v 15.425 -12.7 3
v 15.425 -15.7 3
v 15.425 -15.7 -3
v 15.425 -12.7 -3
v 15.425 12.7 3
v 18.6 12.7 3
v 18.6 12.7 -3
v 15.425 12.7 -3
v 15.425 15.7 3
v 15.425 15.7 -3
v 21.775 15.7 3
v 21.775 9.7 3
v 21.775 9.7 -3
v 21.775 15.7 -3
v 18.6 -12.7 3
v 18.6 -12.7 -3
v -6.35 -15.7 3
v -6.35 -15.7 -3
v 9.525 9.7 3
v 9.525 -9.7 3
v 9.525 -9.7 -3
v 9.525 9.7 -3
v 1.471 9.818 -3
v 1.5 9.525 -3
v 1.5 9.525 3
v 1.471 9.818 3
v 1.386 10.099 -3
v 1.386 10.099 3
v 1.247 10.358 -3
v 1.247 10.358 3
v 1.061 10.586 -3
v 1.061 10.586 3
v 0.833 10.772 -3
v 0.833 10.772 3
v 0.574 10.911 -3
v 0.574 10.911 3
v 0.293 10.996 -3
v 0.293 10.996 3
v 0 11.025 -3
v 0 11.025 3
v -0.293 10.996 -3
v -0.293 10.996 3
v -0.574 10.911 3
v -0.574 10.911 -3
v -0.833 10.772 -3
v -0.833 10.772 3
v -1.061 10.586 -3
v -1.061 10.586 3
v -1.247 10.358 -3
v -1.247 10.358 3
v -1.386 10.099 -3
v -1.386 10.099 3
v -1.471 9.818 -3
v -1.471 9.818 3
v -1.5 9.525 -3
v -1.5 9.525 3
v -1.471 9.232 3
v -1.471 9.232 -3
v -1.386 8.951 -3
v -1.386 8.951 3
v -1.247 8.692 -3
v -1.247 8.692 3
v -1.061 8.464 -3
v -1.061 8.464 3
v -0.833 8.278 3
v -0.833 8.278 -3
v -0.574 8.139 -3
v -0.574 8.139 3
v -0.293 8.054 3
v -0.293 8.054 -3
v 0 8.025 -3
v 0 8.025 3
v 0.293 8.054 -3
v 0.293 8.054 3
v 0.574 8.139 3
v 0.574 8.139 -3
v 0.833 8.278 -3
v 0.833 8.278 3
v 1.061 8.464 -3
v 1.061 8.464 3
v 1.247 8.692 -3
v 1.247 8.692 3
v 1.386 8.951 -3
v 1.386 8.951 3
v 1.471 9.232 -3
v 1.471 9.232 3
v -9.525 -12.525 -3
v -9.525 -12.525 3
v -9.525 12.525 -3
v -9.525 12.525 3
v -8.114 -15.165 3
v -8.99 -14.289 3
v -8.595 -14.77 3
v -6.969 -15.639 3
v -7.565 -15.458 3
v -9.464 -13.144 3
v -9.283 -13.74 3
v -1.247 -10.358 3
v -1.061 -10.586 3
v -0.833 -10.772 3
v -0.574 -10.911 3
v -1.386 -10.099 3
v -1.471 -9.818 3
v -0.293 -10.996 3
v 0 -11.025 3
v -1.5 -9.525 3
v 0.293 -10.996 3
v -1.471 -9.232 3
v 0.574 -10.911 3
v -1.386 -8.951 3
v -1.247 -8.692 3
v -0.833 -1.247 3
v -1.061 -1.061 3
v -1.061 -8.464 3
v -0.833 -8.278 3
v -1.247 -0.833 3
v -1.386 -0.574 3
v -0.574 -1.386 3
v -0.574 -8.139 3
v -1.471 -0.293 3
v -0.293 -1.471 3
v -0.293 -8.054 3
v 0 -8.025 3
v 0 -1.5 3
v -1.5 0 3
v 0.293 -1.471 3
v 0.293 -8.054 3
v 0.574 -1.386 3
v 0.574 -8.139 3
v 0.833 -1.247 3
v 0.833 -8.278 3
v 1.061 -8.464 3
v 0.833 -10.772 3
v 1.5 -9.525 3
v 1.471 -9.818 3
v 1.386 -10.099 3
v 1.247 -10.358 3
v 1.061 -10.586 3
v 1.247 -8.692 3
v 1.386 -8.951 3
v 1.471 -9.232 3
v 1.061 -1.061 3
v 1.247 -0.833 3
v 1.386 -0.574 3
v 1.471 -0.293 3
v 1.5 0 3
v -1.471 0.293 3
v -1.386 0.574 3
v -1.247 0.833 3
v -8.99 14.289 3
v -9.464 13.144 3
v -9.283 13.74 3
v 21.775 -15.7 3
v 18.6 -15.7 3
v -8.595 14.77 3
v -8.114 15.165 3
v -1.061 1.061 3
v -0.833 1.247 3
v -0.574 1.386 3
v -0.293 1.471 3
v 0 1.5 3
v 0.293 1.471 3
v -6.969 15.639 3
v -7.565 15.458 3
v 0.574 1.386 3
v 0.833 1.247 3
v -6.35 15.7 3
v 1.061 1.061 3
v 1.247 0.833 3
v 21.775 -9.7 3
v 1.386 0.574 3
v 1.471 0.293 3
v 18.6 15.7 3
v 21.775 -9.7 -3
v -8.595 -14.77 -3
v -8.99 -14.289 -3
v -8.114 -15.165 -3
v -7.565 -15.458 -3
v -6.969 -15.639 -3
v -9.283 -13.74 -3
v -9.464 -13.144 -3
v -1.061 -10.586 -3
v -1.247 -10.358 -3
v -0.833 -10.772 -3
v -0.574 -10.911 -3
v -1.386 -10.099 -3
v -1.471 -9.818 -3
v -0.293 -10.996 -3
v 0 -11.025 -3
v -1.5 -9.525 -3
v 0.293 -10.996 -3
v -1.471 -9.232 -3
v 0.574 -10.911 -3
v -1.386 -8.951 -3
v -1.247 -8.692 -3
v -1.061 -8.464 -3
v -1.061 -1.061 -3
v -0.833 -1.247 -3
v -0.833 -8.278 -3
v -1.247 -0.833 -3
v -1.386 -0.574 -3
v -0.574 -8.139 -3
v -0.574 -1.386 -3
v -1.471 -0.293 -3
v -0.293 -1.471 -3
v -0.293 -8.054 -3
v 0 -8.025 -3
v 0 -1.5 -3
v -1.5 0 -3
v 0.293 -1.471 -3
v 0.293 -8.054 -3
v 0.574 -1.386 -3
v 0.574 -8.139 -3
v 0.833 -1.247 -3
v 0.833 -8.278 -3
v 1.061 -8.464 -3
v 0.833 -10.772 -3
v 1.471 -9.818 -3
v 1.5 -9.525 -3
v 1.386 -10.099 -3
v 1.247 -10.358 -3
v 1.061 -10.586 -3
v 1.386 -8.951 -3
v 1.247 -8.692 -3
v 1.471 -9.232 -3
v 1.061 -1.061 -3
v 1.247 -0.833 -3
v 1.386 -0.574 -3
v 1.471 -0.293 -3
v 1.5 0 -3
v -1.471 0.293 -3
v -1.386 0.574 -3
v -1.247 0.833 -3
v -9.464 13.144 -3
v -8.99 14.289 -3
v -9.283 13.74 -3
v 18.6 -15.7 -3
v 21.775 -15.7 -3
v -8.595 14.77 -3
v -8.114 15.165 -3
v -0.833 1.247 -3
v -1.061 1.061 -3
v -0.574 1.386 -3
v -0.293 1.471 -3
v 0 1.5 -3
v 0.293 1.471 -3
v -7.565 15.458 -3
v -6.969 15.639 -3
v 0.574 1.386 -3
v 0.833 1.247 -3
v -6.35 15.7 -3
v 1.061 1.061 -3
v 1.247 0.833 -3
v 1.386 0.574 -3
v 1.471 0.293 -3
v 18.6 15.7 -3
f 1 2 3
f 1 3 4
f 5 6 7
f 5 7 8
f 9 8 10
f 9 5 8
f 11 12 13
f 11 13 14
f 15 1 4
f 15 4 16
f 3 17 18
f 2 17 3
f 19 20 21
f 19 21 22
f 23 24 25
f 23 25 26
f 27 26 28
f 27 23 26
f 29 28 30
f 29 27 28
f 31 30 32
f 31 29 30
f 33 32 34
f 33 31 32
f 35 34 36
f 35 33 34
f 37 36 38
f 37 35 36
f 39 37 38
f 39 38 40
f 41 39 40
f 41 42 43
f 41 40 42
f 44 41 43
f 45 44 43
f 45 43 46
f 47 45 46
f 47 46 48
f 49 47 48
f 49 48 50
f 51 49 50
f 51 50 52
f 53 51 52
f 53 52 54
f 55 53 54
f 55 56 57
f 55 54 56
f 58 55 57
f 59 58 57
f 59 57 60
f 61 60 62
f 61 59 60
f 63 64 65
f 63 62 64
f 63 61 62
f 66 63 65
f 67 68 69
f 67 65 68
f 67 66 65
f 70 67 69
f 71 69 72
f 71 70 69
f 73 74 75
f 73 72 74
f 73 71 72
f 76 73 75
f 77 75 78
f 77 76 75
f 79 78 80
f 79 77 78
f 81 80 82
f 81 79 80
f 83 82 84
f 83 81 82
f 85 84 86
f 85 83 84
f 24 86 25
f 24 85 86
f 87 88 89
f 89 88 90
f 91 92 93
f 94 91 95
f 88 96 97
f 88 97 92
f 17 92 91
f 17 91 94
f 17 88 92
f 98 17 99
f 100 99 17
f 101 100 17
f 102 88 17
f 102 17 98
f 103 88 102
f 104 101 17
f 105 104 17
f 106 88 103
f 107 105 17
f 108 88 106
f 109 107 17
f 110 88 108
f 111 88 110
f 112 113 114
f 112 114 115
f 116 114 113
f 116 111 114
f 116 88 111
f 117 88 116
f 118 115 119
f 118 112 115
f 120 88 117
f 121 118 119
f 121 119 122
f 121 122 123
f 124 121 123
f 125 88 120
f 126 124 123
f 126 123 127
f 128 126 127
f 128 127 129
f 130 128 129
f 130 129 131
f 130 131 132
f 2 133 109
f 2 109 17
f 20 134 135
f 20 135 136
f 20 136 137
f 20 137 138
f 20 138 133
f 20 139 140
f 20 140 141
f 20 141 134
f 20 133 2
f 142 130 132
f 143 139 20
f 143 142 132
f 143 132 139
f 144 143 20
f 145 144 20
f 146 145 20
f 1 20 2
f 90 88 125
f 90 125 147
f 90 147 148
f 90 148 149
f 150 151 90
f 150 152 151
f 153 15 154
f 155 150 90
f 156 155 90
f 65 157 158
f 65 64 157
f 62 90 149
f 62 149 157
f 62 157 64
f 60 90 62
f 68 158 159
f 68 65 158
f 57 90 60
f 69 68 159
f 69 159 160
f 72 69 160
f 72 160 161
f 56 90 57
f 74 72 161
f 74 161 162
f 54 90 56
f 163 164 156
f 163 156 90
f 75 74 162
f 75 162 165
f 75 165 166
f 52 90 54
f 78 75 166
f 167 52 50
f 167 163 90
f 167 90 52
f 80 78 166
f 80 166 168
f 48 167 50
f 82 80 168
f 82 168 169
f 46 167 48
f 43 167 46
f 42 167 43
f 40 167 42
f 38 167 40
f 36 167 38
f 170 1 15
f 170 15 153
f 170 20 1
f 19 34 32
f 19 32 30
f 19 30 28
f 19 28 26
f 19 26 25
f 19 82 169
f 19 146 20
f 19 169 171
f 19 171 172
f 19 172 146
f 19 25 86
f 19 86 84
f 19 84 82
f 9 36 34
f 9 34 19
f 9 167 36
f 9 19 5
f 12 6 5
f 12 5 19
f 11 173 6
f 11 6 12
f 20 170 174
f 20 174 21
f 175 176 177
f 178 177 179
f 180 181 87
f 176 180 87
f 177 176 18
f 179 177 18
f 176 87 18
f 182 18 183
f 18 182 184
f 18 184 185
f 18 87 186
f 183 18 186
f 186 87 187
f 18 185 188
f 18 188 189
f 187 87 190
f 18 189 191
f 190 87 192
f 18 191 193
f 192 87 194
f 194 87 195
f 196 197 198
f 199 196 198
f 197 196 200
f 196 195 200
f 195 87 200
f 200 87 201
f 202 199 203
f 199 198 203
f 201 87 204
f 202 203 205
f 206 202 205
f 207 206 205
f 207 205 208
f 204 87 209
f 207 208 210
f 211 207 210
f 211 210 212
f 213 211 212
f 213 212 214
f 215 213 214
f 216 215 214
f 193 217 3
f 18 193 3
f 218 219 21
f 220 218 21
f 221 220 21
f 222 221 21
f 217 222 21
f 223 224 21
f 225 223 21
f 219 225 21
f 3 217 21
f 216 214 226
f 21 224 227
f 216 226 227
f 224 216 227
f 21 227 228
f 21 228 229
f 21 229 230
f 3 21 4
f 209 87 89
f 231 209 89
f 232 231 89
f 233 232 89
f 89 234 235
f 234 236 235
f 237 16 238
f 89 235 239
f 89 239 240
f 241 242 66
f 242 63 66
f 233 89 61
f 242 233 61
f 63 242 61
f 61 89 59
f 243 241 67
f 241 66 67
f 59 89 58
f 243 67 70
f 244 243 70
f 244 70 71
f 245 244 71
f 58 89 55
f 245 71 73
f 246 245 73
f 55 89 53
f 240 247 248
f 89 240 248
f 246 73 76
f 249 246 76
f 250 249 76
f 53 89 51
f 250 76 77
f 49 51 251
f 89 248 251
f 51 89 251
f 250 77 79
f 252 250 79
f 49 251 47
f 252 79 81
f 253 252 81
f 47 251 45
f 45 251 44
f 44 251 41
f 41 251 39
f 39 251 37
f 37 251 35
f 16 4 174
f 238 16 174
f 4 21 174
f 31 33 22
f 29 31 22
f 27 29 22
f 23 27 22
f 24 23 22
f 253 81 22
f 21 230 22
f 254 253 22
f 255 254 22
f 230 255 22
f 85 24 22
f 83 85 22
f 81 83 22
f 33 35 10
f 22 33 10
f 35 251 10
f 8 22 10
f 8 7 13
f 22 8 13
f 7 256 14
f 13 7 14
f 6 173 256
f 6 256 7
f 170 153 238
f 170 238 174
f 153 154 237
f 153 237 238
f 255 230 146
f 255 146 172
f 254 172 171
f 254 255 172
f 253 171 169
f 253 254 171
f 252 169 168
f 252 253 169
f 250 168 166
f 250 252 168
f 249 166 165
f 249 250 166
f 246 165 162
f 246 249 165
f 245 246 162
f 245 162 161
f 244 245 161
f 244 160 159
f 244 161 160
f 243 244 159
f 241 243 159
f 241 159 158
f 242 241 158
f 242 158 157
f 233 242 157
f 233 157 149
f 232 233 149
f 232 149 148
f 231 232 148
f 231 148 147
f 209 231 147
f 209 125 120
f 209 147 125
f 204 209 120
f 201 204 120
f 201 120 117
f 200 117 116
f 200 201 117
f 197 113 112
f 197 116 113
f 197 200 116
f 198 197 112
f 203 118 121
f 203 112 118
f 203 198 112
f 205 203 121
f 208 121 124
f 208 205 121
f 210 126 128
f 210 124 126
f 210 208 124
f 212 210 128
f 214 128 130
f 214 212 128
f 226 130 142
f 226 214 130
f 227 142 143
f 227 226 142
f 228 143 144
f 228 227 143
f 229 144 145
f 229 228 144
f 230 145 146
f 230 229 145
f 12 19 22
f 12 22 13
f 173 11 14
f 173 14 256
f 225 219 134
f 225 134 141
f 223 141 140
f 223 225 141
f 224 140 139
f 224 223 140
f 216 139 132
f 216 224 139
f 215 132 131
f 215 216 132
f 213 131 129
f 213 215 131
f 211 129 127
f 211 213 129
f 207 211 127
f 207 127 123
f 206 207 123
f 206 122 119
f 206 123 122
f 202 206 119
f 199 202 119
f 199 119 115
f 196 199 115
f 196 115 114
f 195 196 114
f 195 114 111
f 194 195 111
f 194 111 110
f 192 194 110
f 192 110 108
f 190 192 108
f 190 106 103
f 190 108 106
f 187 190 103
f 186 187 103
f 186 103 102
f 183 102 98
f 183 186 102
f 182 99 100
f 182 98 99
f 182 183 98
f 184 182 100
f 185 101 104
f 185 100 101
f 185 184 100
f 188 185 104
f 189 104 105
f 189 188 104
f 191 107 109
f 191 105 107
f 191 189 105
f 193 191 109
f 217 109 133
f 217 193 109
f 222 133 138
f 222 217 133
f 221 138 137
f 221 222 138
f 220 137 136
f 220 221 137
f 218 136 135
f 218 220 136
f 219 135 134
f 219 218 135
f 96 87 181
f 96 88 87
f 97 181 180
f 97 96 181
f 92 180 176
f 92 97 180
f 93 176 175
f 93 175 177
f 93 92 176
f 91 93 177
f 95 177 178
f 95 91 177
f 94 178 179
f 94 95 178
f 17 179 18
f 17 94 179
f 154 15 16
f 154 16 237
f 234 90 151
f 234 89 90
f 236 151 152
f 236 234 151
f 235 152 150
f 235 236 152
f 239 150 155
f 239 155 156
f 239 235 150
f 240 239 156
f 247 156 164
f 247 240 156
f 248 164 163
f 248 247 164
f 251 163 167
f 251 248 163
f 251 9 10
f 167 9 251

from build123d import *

# Parameters (mm, degrees)
SKETCH1_W               = 19.05
SKETCH1_H               = 31.399999938
BOSS_EXTRUDE1_DEPTH     = 3
FILLET1_R               = 3.175
CUT_EXTRUDE1_DEPTH      = 28.507101338
CUT_EXTRUDE1_DEPTH_BACK = 28.507101338
SKETCH2_R               = 1.5


with BuildPart() as part:
    # Sketch1 → Boss-Extrude1 (new, symmetric)
    with BuildSketch(Plane.XY):
        Rectangle(SKETCH1_W, SKETCH1_H)
        Polygon((9.525, 15.699999969), (9.525, 9.699999969), (21.775, 9.699999969), (21.775, 15.699999969), (18.6, 15.699999969), (18.6, 12.699999969), (15.425, 12.699999969), (15.425, 15.699999969), align=None)
        Polygon((9.525, -15.699999969), (15.425, -15.699999969), (15.425, -12.699999969), (18.6, -12.699999969), (18.6, -15.699999969), (21.775, -15.699999969), (21.775, -9.699999969), (9.525, -9.699999969), align=None)
    extrude(amount=BOSS_EXTRUDE1_DEPTH, both=True)

    # Fillet1
    fillet1_edges = [part.edges().sort_by_distance(p)[0] for p in [
        (-9.525, -15.699999969, 0),
        (-9.525, 15.699999969, 0),
    ]]
    fillet(fillet1_edges, radius=FILLET1_R)

    # Sketch2 → Cut-Extrude1 (cut, two sides: drawn at the far end of the back side and taken through both)
    with BuildSketch(Plane.XY.offset(3).offset(-CUT_EXTRUDE1_DEPTH_BACK)):
        with Locations((0, 9.525)):
            Circle(SKETCH2_R)
        with Locations((0, -9.525)):
            Circle(SKETCH2_R)
        Circle(SKETCH2_R)
    extrude(amount=CUT_EXTRUDE1_DEPTH + CUT_EXTRUDE1_DEPTH_BACK, mode=Mode.SUBTRACT)


solid = part.part
